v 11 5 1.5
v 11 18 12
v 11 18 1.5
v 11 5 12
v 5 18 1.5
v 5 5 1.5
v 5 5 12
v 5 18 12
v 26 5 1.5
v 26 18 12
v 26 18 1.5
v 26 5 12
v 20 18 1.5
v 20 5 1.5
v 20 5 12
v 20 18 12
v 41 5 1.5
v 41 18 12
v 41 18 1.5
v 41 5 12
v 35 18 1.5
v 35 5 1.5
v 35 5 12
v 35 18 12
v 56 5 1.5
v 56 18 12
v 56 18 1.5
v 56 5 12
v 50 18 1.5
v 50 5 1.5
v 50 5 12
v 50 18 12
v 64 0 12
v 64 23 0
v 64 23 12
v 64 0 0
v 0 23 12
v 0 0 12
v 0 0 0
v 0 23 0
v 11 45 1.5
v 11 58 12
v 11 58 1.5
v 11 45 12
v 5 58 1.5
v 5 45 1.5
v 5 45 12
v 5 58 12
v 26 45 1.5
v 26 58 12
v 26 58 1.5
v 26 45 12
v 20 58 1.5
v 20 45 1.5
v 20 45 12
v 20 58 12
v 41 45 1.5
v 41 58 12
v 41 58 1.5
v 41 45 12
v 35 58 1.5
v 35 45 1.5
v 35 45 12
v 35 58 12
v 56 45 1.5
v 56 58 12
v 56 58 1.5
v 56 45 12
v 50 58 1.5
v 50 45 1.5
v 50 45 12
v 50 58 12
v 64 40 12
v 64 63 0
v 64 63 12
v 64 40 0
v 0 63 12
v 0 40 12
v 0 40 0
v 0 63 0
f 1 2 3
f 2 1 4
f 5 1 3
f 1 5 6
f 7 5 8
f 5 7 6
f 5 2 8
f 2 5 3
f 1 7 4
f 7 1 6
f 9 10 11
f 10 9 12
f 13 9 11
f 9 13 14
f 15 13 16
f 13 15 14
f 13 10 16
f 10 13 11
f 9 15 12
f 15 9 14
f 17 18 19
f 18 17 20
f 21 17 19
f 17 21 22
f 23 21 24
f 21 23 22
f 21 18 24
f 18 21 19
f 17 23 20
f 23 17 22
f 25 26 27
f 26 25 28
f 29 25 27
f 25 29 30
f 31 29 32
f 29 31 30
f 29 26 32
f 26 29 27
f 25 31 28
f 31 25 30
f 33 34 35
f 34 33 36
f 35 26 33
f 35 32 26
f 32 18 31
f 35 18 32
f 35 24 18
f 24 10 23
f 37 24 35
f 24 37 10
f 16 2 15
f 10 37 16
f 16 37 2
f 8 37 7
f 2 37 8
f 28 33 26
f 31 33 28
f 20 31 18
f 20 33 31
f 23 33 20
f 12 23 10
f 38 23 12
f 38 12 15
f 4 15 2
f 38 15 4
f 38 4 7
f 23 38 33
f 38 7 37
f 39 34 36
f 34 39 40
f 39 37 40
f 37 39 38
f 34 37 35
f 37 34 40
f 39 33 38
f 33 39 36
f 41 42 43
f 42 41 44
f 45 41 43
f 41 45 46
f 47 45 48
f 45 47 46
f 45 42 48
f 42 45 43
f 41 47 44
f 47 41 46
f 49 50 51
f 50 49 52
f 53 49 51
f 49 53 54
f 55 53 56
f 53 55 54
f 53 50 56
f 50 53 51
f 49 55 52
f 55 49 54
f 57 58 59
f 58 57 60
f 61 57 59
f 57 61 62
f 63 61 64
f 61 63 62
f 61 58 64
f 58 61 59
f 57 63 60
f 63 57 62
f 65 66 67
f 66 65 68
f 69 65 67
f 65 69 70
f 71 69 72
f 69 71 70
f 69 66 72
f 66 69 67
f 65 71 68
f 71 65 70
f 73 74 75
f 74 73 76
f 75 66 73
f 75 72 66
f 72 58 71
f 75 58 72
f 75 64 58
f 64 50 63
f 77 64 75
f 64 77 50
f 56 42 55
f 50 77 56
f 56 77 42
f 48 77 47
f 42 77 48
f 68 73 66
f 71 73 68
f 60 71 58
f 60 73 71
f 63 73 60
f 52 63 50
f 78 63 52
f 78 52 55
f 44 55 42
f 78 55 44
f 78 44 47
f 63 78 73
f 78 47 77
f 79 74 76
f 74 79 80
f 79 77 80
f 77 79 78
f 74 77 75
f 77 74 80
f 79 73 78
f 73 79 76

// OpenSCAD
//Porta pendrives param�trico con textos
use <WriteSVG.scad>



//Modulo para agujero. Las medidas de un conector USB son 11x4.7x13. Se hacen un poco m�s grande el agujero
module agujero(){

cube(size=[6,13,12]);
}

// Modulo para generar el porta Pendrives con el n� de agujeros como par�metro de entrada
module portaPD(nAg,txtFront, textBack){
	// Se calcula la longitud del cuerpo principal
	// separacion del primer agujero + n�agujerosxancho agujeros+ n� agujeros menso uno por la separaci�n entre agujeros + separaci�n del �ltimo agujero
	longX = 5+6*nAg+10*(nAg-1)+5;

	union(){
		difference(){
			// Cuerpo principal
			cube(size=[longX,23,12]);
			
			//Agujeros	
			for ( i = [0:nAg-1 ] )
			{
				translate([5+i*15,5,1.5])agujero(); 
			}
			
			//A�o 
			translate([1,21/2,10/2])rotate([0,0,-90])writecube("2014",[0,0,0],[0,0,0]);			
		}
		//Texto alante
		writecube(txtFront,[longX/2,0,12/2],[longX,0,10]);
		//Texto atr�s
		translate([longX/2,23,12/2])rotate([0,0,180])writecube(textBack,[0,0,0],[0,0,0]);
		
	}
}


portaPD(4,"C. San Jose","Mar");

translate([0, 40, 0])portaPD(4,"C. San Jose","Teresa");
